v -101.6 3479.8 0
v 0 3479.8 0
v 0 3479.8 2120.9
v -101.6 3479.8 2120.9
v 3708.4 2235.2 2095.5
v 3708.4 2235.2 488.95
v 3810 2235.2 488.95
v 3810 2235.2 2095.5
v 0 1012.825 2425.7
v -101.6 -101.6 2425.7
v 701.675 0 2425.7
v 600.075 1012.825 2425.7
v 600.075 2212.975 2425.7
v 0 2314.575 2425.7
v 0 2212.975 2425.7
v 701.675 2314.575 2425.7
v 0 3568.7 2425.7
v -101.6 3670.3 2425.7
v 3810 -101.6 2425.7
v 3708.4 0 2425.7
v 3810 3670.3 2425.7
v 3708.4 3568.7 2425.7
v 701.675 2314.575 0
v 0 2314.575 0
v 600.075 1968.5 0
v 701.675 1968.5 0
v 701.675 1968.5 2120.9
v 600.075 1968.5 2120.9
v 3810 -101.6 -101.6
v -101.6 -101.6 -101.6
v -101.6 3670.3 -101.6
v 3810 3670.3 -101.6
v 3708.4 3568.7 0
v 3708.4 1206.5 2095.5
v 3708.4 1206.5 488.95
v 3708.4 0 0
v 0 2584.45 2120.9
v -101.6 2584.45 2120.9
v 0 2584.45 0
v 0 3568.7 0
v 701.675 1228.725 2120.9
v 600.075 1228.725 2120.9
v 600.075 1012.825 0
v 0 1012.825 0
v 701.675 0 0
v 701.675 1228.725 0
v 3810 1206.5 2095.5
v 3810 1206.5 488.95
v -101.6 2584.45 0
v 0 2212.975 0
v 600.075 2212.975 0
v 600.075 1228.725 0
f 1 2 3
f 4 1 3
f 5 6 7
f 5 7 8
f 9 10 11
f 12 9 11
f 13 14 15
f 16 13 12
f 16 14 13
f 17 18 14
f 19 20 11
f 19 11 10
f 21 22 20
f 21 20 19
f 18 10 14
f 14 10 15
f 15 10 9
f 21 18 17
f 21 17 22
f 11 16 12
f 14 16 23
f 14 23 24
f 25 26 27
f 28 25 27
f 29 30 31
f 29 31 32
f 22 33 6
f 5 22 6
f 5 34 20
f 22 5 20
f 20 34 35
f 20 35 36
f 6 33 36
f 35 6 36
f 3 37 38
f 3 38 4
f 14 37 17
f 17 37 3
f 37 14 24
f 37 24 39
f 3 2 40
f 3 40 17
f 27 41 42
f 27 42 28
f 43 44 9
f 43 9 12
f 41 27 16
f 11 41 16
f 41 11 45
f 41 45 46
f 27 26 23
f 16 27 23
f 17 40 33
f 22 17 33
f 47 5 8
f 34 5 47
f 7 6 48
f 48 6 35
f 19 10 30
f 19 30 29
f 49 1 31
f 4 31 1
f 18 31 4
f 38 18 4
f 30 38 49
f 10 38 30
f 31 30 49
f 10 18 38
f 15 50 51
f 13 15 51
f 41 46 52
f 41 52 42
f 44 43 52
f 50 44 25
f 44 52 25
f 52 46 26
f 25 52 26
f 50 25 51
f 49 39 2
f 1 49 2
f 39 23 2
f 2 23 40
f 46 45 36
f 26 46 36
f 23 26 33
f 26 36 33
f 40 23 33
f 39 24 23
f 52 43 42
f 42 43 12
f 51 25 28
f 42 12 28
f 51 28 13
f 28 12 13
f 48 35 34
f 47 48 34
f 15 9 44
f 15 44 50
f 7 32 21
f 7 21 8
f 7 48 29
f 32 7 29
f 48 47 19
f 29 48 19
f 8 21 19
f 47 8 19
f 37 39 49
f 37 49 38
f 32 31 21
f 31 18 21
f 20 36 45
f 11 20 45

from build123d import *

# Parameters (mm, degrees)
F0_W      = 3911.6
F0_H      = 3771.9
F1_DEPTH  = 2425.7
F2_W      = 3911.6
F2_H      = 3771.9
F3_DEPTH  = 101.6
F4_W      = 895.35
F4_H      = 2120.9
F5_DEPTH  = 101.601
F6_W      = 1028.7
F6_H      = 1606.55
F7_DEPTH  = 101.601
F8_W      = 739.775
F8_H      = 2120.9
F9_DEPTH  = 101.6
F10_W     = 600.075
F10_H     = 1200.15
F11_DEPTH = 2425.7


with BuildPart() as f1:
    # F0 (on Top) → F1 (new body)
    with BuildSketch(Plane.XY):
        with Locations((1854.2, 1784.35)):
            Rectangle(F0_W, F0_H)
        Polygon((3708.4, 0), (701.675, 0), (701.675, 2314.575), (0, 2314.575), (0, 3568.7), (3708.4, 3568.7), align=None, mode=Mode.SUBTRACT)
    extrude(amount=F1_DEPTH)

    # F2 (on face) → F3 (join)
    with BuildSketch(Plane(origin=(0, 0, 0), x_dir=(1, 0, 0), z_dir=(0, 0, -1))):
        with Locations((1854.2, -1784.35)):
            Rectangle(F2_W, F2_H)
    extrude(amount=F3_DEPTH)

    # F4 (on face) → F5 (cut, through all)
    with BuildSketch(Plane.YZ):
        with Locations((3032.125, 1060.45)):
            Rectangle(F4_W, F4_H)
    extrude(amount=-F5_DEPTH, mode=Mode.SUBTRACT)

    # F6 (on face) → F7 (cut, through all)
    with BuildSketch(Plane(origin=(3708.4, 0, 0), x_dir=(0, -1, 0), z_dir=(-1, 0, 0))):
        with Locations((-1720.85, 1292.225)):
            Rectangle(F6_W, F6_H)
    extrude(amount=-F7_DEPTH, mode=Mode.SUBTRACT)

    # F8 (on face) → F9 (cut)
    with BuildSketch(Plane.YZ.offset(701.675)):
        with Locations((1598.6125, 1060.45)):
            Rectangle(F8_W, F8_H)
    extrude(amount=-F9_DEPTH, mode=Mode.SUBTRACT)

    # F10 (on face) → F11 (cut, through all)
    with BuildSketch(Plane.XY.offset(2425.7)):
        with Locations((300.0375, 1612.9)):
            Rectangle(F10_W, F10_H)
    extrude(amount=-F11_DEPTH, mode=Mode.SUBTRACT)


solid = f1.part
